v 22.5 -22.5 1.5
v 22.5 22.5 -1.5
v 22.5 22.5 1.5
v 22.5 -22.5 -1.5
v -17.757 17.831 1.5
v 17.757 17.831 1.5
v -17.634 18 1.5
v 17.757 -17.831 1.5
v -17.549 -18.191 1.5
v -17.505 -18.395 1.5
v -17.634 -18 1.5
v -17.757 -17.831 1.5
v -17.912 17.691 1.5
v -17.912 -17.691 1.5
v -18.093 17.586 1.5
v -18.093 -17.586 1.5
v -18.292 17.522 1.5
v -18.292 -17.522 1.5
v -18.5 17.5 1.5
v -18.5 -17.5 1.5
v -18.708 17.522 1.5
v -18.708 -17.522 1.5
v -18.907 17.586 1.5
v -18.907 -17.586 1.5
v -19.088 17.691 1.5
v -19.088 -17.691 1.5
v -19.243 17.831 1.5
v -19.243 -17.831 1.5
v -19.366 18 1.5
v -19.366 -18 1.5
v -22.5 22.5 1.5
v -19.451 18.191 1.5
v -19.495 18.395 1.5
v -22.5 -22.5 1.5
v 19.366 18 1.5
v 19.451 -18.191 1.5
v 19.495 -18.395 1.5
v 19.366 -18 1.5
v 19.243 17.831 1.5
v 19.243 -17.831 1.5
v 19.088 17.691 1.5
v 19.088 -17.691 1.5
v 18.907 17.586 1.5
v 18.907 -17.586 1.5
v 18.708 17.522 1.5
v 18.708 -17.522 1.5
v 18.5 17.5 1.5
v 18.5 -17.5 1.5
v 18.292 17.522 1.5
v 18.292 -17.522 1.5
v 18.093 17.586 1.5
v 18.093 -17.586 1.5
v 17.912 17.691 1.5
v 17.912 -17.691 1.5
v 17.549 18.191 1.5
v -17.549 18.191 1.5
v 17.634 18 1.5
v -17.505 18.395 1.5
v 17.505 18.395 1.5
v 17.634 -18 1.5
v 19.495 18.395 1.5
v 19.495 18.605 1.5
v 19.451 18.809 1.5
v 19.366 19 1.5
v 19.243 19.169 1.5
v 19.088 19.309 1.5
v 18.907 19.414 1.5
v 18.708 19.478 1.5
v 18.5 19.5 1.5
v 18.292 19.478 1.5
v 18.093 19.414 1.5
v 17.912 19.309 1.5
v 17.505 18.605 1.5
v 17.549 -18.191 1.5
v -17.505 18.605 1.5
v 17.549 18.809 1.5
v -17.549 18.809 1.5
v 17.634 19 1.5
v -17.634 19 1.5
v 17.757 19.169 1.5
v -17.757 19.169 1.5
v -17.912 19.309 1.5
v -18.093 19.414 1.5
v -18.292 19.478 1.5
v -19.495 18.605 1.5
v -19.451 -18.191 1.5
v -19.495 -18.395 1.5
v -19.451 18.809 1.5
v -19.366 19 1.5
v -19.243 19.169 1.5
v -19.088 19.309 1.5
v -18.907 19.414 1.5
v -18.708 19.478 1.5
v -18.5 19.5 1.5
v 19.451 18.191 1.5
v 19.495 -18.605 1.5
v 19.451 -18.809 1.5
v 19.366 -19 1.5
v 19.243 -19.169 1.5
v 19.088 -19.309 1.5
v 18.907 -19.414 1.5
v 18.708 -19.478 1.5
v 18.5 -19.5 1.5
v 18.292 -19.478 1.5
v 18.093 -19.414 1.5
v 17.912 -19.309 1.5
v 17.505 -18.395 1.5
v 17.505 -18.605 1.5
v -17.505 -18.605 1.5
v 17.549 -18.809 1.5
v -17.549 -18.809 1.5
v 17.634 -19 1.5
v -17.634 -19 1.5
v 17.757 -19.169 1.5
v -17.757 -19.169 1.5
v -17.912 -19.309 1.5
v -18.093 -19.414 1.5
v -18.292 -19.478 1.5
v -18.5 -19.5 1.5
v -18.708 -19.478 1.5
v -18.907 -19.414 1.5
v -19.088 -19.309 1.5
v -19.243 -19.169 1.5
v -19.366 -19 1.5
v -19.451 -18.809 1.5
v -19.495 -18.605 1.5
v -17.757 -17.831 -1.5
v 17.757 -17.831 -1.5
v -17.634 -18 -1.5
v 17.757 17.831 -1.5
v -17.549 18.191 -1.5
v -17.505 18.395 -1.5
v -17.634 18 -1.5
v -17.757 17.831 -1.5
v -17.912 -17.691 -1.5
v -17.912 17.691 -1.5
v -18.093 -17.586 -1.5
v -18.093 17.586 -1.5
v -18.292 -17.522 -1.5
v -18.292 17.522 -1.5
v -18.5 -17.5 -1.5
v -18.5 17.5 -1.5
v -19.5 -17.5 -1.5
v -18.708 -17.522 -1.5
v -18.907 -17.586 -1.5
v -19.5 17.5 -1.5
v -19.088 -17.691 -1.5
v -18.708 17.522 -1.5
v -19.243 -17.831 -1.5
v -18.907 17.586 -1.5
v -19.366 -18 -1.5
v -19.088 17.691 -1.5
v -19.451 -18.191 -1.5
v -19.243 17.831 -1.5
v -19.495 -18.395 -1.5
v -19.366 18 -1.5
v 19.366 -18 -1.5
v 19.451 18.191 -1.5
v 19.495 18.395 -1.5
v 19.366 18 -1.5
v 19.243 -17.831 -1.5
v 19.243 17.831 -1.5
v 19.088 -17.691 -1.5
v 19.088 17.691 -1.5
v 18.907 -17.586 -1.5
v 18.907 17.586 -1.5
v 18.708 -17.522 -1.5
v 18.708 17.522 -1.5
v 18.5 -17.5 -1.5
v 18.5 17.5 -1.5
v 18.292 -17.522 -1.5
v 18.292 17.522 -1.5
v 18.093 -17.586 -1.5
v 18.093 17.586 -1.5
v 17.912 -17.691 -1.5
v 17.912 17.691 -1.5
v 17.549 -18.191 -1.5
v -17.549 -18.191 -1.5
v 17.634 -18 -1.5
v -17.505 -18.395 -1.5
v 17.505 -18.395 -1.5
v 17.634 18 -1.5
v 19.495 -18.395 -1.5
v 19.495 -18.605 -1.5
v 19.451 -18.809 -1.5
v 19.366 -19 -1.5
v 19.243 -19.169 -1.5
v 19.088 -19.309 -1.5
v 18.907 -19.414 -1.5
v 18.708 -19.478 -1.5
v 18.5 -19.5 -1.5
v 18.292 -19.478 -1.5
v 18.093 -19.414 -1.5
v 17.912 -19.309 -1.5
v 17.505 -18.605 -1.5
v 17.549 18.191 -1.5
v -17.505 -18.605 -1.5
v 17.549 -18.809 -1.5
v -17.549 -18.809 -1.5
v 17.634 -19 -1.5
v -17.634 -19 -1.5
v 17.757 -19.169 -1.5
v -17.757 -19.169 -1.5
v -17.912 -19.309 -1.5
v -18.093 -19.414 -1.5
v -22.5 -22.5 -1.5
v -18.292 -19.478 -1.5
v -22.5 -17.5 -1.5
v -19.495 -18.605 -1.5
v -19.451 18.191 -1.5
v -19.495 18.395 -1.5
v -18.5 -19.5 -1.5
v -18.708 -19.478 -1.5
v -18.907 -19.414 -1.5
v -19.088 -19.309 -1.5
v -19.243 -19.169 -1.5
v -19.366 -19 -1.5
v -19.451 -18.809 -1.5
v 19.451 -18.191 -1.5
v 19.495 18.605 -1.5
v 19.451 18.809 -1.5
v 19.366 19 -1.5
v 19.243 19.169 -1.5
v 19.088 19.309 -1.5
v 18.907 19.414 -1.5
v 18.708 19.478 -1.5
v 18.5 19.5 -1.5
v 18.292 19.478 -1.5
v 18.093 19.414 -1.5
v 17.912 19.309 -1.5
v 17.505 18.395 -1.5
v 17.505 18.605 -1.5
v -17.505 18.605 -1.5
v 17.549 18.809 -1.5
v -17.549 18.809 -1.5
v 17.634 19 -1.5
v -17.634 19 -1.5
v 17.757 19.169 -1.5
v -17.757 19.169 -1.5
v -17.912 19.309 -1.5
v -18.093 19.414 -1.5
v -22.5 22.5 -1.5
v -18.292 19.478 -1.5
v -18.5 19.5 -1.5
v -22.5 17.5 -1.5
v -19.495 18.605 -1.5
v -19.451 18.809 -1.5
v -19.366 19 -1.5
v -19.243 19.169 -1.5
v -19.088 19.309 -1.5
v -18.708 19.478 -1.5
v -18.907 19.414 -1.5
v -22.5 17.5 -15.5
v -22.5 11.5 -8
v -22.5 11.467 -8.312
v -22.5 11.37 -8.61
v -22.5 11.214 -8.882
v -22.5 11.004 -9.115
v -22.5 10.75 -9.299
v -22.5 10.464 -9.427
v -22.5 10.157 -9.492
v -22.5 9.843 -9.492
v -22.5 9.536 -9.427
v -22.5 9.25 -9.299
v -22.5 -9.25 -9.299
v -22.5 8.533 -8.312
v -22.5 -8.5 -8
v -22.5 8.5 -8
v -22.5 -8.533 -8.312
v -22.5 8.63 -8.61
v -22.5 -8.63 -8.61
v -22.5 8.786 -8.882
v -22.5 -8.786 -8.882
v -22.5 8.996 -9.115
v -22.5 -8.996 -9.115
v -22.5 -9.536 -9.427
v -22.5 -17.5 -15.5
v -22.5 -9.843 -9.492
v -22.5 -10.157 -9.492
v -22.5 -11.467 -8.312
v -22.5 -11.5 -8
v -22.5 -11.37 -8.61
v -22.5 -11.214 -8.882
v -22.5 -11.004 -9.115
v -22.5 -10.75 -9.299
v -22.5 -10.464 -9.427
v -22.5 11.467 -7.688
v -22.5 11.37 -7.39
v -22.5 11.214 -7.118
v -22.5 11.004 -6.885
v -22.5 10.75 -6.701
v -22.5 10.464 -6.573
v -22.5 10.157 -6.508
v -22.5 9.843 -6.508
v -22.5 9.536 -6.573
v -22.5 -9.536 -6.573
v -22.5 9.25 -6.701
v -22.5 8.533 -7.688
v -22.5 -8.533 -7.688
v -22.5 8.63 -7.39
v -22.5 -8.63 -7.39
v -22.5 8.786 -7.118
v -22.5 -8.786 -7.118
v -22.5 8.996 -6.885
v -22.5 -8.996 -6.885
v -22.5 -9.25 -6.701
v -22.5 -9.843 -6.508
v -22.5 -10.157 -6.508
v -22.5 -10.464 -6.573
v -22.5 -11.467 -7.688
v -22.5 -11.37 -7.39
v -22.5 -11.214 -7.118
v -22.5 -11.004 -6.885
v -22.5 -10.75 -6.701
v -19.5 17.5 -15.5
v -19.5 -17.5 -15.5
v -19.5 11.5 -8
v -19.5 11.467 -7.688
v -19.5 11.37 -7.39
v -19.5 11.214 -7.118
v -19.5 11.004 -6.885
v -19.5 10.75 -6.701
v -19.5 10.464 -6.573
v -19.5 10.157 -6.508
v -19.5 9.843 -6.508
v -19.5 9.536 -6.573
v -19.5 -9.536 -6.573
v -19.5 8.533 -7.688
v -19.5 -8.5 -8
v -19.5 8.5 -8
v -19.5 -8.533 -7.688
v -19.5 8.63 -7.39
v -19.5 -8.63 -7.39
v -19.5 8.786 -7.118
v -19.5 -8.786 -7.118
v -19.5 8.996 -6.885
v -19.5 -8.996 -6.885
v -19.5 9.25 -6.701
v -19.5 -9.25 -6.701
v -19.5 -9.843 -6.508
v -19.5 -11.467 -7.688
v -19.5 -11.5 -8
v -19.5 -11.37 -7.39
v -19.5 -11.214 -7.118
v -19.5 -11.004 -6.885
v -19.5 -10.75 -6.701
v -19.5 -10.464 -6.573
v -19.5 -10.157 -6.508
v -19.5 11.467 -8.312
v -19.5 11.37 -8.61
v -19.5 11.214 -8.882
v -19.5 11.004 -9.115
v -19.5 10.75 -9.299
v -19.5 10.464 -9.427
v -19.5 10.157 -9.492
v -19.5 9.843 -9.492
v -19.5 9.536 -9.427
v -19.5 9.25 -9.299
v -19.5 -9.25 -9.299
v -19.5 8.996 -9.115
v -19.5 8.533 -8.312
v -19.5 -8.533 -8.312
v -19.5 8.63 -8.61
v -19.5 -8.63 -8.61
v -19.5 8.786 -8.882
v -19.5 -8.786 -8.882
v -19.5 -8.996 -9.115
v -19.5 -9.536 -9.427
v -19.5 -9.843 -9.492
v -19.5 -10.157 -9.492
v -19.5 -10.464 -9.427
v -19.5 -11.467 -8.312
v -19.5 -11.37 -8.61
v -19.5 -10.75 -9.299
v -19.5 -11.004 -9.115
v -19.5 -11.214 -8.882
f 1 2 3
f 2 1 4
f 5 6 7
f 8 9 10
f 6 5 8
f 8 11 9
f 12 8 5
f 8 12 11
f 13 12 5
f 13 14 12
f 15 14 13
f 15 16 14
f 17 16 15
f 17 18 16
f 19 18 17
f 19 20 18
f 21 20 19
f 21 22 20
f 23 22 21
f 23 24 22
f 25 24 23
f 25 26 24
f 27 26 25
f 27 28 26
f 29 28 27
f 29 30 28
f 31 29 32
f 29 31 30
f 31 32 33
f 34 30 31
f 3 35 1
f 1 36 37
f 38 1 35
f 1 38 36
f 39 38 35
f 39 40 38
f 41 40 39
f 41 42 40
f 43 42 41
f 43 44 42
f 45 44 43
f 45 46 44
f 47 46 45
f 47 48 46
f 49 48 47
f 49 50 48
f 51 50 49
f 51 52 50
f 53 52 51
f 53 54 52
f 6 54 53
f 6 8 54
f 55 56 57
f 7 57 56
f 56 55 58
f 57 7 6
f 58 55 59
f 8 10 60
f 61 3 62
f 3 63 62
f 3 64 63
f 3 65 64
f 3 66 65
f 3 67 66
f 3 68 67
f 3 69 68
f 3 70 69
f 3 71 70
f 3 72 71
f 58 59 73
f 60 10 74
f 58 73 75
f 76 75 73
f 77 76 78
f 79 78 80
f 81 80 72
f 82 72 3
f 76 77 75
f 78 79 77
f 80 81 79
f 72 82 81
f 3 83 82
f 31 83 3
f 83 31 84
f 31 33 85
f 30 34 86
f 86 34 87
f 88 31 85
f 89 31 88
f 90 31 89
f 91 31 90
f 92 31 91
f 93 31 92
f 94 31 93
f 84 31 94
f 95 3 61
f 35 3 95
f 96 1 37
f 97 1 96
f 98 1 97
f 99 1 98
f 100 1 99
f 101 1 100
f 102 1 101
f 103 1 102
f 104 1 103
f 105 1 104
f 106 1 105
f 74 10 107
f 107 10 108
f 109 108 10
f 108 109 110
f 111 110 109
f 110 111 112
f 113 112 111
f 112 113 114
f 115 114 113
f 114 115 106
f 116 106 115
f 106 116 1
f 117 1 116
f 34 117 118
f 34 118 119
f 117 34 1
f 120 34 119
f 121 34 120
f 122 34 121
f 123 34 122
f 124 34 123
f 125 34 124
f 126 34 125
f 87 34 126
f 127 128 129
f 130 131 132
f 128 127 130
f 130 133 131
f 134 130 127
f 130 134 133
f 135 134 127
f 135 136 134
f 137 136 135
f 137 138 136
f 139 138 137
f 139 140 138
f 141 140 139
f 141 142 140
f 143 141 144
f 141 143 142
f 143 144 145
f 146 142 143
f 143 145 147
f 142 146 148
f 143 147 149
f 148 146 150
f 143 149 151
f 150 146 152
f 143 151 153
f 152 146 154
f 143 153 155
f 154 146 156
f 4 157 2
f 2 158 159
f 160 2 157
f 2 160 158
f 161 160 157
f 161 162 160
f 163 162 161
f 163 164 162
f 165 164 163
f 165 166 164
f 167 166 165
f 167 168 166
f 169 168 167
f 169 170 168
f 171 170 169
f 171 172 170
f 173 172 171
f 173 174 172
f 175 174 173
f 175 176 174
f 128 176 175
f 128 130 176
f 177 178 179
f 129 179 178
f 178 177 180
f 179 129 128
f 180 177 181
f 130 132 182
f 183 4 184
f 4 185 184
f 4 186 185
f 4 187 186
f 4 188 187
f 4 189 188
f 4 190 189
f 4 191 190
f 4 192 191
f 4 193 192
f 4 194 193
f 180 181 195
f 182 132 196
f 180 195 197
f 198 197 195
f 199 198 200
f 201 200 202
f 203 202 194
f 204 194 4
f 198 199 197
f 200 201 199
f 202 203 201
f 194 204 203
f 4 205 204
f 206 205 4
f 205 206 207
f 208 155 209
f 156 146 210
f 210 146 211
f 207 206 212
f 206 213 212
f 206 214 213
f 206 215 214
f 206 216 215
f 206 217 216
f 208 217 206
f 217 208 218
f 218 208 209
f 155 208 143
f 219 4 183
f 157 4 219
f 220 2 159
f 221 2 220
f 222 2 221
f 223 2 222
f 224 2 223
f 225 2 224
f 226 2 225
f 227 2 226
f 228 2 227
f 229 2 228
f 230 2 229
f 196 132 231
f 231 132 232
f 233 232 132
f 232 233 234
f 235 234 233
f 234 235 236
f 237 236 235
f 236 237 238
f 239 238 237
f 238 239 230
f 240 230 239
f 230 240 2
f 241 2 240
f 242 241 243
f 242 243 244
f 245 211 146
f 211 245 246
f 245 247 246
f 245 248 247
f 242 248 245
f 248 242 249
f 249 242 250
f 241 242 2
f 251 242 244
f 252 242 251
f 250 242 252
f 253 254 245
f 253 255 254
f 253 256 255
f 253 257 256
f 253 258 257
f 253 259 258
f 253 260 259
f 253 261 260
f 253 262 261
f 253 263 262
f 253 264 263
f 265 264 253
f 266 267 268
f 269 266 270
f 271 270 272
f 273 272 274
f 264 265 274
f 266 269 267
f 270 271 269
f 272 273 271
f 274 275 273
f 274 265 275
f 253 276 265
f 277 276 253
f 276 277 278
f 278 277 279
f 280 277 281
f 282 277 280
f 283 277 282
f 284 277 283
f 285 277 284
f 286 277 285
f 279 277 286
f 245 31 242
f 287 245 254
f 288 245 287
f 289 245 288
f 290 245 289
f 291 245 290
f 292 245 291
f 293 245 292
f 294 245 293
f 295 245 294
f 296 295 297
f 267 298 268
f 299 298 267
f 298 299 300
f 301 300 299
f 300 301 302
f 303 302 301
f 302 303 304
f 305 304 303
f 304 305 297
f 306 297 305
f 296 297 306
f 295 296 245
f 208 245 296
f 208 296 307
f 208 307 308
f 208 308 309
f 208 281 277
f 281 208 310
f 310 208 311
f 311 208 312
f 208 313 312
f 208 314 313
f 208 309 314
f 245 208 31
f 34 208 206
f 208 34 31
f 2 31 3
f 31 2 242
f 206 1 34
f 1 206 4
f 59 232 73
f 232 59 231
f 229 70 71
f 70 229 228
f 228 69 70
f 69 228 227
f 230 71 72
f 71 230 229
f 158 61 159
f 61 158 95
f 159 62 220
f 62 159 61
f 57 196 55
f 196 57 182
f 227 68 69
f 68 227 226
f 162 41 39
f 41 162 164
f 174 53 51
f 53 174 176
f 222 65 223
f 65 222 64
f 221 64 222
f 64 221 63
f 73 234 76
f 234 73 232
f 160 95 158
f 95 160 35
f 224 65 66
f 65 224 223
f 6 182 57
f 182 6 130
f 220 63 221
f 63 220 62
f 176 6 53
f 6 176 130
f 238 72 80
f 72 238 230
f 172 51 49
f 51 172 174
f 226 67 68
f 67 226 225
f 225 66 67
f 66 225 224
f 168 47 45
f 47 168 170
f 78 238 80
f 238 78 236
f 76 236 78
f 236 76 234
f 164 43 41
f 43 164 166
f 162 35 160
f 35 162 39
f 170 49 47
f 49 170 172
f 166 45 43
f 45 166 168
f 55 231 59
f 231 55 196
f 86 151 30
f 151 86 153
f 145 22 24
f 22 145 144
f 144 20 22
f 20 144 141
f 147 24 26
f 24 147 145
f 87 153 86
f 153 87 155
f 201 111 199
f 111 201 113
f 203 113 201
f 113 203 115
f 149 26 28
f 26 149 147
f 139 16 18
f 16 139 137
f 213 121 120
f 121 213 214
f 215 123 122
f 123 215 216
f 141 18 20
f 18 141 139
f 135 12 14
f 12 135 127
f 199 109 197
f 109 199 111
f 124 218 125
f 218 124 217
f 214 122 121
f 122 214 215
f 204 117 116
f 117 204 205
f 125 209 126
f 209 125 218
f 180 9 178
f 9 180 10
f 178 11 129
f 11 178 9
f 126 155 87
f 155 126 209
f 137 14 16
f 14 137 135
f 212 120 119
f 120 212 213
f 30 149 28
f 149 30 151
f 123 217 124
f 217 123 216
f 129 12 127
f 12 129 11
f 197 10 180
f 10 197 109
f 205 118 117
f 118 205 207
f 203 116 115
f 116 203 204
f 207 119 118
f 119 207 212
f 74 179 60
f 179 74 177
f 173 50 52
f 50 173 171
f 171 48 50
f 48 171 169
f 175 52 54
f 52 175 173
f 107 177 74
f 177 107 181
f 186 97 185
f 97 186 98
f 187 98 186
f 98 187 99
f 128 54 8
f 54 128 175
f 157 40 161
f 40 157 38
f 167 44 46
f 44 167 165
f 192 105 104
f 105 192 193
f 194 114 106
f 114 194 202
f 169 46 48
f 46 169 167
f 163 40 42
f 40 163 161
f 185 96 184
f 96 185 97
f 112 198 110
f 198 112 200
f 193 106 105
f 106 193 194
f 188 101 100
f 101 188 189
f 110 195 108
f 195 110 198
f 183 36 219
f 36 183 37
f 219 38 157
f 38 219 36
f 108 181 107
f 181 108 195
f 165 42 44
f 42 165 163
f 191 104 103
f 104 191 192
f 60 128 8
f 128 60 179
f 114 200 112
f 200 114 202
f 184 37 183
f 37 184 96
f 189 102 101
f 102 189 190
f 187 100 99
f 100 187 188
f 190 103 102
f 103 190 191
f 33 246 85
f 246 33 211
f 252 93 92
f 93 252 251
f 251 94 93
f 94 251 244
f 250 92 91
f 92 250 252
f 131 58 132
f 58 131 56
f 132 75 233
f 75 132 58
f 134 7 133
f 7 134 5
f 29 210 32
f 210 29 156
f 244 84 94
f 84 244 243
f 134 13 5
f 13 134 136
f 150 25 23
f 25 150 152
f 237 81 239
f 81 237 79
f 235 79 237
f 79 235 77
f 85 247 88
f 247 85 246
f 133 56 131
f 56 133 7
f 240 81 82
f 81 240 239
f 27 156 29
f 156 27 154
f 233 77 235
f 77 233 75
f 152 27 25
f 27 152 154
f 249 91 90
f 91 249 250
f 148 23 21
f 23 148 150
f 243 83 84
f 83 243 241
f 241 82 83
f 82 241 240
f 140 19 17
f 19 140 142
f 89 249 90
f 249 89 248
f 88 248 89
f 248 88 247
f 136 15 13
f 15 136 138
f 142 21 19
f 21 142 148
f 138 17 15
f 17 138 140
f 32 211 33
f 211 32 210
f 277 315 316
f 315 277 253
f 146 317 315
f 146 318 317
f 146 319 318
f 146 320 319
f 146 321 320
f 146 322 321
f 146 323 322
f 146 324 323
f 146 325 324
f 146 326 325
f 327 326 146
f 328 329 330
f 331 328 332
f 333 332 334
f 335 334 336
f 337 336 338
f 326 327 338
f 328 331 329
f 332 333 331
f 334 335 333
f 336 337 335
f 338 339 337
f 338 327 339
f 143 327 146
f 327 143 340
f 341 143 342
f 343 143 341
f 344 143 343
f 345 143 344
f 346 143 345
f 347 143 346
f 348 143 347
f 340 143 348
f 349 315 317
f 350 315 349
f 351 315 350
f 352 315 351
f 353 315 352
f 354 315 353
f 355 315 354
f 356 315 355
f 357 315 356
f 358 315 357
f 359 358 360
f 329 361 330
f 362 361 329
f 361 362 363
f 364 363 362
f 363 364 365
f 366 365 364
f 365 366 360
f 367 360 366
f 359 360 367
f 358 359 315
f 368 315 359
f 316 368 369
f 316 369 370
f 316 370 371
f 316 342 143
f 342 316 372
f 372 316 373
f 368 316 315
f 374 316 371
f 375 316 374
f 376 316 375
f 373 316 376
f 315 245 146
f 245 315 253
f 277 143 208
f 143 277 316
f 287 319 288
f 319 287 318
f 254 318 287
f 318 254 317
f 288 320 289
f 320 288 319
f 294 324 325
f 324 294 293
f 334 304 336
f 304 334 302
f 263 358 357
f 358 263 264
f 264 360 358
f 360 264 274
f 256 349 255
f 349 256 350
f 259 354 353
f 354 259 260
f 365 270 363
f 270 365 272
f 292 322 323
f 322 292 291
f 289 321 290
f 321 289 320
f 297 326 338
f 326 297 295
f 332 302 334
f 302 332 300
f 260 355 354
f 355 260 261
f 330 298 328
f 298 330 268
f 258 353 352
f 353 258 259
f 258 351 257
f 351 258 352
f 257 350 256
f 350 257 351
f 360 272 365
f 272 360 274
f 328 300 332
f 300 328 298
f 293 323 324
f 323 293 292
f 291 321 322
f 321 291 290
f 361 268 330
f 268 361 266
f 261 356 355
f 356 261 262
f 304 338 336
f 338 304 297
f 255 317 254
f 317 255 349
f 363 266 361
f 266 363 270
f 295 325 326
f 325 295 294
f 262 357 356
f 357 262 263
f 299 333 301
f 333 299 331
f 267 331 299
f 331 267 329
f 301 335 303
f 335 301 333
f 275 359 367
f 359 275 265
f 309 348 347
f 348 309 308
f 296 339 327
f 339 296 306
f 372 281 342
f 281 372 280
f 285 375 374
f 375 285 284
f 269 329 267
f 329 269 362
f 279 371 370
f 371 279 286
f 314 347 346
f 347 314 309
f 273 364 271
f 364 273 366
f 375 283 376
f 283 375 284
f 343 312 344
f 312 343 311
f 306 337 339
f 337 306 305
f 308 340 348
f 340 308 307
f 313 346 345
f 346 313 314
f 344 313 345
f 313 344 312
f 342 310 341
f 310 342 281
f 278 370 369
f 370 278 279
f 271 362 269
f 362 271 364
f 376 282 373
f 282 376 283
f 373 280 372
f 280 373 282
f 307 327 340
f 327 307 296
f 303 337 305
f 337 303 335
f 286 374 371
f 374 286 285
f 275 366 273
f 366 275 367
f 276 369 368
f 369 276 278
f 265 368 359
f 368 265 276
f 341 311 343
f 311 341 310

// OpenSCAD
// H-Brückenhalterung

/*[ quadratischer Halter ]*/
// zeige quadratischer Halter//
show_quadrat = true;

// Q= Größe des Quadrats
Q=45;       
// L = Lochabstand für H-Brücke
L=37; 

/*[ rechteckiger Halter ]*/
// zeige rechteckiger Halter//
show_rechteck = false;
// Breite des Rechtecks
R1 = 20;
// Länge des Rechtecks
R2 = 30;
// Lochabstand breite Seite
L1 = 15;
// Lochabstand lange Seiter
L2 =24;
/*[ Befestigungswinkel ]*/
// A = Abstand des Befestigungswinkels von der Mitte
A= 21;
// LAW = Abstand der Löcher auf Winkel
LAW = 20;

/*[ Löcher ]*/
// DQ = Durchmesser Löcher auf Platte
DP = 2;
// DW = Durchmesser Löcher auf Winkel
DW = 3;

if (show_quadrat) {
    Halter();
} else {
    Rechteck();
}

module Halter() {
    $fn=30;
    difference() {
        cube([Q,Q,3],center=true);
        
        translate([L/2,L/2,-1])
        rotate([0,0,90])
        cylinder(d=DP,h=7, center=true);
        
        translate([-L/2,-L/2,-1])
        rotate([0,0,90])
        cylinder(d=DP,h=7, center=true);
        
        translate([L/2,-L/2,-1])
        rotate([0,0,90])
        cylinder(d=DP,h=7, center=true);
        
        translate([-L/2,L/2,-1])
        rotate([0,0,90])
        cylinder(d=DP,h=7, center=true);
    }    
    

    translate([-A,0,-8])
    rotate([0,90,0])
    difference() {
        cube([15,L-DP,3], center=true);

        translate([0,LAW/2,0])
        rotate([0,0,90])
        cylinder(d=DW,h=5, center=true);
        
        translate([0,-LAW/2,0])
        rotate([0,0,90])
        cylinder(d=DW,h=5, center=true);
        
    }
}

module Rechteck() {
    $fn=30;
    difference() {
        cube([R1,R2,3],center=true);
        
        translate([L1/2,L2/2,-1])
        rotate([0,0,90])
        cylinder(d=DP,h=7, center=true);
        
        translate([-L1/2,-L2/2,-1])
        rotate([0,0,90])
        cylinder(d=DP,h=7, center=true);
        
        translate([L1/2,-L2/2,-1])
        rotate([0,0,90])
        cylinder(d=DP,h=7, center=true);
        
        translate([-L1/2,L2/2,-1])
        rotate([0,0,90])
        cylinder(d=DP,h=7, center=true);
    }    
    

    translate([-A,0,-8])
    rotate([0,90,0])
    difference() {
        cube([15,L2-DP,3], center=true);

        translate([0,LAW/2,0])
        rotate([0,0,90])
        cylinder(d=DW,h=5, center=true);
        
        translate([0,-LAW/2,0])
        rotate([0,0,90])
        cylinder(d=DW,h=5, center=true);
        
    }
}
